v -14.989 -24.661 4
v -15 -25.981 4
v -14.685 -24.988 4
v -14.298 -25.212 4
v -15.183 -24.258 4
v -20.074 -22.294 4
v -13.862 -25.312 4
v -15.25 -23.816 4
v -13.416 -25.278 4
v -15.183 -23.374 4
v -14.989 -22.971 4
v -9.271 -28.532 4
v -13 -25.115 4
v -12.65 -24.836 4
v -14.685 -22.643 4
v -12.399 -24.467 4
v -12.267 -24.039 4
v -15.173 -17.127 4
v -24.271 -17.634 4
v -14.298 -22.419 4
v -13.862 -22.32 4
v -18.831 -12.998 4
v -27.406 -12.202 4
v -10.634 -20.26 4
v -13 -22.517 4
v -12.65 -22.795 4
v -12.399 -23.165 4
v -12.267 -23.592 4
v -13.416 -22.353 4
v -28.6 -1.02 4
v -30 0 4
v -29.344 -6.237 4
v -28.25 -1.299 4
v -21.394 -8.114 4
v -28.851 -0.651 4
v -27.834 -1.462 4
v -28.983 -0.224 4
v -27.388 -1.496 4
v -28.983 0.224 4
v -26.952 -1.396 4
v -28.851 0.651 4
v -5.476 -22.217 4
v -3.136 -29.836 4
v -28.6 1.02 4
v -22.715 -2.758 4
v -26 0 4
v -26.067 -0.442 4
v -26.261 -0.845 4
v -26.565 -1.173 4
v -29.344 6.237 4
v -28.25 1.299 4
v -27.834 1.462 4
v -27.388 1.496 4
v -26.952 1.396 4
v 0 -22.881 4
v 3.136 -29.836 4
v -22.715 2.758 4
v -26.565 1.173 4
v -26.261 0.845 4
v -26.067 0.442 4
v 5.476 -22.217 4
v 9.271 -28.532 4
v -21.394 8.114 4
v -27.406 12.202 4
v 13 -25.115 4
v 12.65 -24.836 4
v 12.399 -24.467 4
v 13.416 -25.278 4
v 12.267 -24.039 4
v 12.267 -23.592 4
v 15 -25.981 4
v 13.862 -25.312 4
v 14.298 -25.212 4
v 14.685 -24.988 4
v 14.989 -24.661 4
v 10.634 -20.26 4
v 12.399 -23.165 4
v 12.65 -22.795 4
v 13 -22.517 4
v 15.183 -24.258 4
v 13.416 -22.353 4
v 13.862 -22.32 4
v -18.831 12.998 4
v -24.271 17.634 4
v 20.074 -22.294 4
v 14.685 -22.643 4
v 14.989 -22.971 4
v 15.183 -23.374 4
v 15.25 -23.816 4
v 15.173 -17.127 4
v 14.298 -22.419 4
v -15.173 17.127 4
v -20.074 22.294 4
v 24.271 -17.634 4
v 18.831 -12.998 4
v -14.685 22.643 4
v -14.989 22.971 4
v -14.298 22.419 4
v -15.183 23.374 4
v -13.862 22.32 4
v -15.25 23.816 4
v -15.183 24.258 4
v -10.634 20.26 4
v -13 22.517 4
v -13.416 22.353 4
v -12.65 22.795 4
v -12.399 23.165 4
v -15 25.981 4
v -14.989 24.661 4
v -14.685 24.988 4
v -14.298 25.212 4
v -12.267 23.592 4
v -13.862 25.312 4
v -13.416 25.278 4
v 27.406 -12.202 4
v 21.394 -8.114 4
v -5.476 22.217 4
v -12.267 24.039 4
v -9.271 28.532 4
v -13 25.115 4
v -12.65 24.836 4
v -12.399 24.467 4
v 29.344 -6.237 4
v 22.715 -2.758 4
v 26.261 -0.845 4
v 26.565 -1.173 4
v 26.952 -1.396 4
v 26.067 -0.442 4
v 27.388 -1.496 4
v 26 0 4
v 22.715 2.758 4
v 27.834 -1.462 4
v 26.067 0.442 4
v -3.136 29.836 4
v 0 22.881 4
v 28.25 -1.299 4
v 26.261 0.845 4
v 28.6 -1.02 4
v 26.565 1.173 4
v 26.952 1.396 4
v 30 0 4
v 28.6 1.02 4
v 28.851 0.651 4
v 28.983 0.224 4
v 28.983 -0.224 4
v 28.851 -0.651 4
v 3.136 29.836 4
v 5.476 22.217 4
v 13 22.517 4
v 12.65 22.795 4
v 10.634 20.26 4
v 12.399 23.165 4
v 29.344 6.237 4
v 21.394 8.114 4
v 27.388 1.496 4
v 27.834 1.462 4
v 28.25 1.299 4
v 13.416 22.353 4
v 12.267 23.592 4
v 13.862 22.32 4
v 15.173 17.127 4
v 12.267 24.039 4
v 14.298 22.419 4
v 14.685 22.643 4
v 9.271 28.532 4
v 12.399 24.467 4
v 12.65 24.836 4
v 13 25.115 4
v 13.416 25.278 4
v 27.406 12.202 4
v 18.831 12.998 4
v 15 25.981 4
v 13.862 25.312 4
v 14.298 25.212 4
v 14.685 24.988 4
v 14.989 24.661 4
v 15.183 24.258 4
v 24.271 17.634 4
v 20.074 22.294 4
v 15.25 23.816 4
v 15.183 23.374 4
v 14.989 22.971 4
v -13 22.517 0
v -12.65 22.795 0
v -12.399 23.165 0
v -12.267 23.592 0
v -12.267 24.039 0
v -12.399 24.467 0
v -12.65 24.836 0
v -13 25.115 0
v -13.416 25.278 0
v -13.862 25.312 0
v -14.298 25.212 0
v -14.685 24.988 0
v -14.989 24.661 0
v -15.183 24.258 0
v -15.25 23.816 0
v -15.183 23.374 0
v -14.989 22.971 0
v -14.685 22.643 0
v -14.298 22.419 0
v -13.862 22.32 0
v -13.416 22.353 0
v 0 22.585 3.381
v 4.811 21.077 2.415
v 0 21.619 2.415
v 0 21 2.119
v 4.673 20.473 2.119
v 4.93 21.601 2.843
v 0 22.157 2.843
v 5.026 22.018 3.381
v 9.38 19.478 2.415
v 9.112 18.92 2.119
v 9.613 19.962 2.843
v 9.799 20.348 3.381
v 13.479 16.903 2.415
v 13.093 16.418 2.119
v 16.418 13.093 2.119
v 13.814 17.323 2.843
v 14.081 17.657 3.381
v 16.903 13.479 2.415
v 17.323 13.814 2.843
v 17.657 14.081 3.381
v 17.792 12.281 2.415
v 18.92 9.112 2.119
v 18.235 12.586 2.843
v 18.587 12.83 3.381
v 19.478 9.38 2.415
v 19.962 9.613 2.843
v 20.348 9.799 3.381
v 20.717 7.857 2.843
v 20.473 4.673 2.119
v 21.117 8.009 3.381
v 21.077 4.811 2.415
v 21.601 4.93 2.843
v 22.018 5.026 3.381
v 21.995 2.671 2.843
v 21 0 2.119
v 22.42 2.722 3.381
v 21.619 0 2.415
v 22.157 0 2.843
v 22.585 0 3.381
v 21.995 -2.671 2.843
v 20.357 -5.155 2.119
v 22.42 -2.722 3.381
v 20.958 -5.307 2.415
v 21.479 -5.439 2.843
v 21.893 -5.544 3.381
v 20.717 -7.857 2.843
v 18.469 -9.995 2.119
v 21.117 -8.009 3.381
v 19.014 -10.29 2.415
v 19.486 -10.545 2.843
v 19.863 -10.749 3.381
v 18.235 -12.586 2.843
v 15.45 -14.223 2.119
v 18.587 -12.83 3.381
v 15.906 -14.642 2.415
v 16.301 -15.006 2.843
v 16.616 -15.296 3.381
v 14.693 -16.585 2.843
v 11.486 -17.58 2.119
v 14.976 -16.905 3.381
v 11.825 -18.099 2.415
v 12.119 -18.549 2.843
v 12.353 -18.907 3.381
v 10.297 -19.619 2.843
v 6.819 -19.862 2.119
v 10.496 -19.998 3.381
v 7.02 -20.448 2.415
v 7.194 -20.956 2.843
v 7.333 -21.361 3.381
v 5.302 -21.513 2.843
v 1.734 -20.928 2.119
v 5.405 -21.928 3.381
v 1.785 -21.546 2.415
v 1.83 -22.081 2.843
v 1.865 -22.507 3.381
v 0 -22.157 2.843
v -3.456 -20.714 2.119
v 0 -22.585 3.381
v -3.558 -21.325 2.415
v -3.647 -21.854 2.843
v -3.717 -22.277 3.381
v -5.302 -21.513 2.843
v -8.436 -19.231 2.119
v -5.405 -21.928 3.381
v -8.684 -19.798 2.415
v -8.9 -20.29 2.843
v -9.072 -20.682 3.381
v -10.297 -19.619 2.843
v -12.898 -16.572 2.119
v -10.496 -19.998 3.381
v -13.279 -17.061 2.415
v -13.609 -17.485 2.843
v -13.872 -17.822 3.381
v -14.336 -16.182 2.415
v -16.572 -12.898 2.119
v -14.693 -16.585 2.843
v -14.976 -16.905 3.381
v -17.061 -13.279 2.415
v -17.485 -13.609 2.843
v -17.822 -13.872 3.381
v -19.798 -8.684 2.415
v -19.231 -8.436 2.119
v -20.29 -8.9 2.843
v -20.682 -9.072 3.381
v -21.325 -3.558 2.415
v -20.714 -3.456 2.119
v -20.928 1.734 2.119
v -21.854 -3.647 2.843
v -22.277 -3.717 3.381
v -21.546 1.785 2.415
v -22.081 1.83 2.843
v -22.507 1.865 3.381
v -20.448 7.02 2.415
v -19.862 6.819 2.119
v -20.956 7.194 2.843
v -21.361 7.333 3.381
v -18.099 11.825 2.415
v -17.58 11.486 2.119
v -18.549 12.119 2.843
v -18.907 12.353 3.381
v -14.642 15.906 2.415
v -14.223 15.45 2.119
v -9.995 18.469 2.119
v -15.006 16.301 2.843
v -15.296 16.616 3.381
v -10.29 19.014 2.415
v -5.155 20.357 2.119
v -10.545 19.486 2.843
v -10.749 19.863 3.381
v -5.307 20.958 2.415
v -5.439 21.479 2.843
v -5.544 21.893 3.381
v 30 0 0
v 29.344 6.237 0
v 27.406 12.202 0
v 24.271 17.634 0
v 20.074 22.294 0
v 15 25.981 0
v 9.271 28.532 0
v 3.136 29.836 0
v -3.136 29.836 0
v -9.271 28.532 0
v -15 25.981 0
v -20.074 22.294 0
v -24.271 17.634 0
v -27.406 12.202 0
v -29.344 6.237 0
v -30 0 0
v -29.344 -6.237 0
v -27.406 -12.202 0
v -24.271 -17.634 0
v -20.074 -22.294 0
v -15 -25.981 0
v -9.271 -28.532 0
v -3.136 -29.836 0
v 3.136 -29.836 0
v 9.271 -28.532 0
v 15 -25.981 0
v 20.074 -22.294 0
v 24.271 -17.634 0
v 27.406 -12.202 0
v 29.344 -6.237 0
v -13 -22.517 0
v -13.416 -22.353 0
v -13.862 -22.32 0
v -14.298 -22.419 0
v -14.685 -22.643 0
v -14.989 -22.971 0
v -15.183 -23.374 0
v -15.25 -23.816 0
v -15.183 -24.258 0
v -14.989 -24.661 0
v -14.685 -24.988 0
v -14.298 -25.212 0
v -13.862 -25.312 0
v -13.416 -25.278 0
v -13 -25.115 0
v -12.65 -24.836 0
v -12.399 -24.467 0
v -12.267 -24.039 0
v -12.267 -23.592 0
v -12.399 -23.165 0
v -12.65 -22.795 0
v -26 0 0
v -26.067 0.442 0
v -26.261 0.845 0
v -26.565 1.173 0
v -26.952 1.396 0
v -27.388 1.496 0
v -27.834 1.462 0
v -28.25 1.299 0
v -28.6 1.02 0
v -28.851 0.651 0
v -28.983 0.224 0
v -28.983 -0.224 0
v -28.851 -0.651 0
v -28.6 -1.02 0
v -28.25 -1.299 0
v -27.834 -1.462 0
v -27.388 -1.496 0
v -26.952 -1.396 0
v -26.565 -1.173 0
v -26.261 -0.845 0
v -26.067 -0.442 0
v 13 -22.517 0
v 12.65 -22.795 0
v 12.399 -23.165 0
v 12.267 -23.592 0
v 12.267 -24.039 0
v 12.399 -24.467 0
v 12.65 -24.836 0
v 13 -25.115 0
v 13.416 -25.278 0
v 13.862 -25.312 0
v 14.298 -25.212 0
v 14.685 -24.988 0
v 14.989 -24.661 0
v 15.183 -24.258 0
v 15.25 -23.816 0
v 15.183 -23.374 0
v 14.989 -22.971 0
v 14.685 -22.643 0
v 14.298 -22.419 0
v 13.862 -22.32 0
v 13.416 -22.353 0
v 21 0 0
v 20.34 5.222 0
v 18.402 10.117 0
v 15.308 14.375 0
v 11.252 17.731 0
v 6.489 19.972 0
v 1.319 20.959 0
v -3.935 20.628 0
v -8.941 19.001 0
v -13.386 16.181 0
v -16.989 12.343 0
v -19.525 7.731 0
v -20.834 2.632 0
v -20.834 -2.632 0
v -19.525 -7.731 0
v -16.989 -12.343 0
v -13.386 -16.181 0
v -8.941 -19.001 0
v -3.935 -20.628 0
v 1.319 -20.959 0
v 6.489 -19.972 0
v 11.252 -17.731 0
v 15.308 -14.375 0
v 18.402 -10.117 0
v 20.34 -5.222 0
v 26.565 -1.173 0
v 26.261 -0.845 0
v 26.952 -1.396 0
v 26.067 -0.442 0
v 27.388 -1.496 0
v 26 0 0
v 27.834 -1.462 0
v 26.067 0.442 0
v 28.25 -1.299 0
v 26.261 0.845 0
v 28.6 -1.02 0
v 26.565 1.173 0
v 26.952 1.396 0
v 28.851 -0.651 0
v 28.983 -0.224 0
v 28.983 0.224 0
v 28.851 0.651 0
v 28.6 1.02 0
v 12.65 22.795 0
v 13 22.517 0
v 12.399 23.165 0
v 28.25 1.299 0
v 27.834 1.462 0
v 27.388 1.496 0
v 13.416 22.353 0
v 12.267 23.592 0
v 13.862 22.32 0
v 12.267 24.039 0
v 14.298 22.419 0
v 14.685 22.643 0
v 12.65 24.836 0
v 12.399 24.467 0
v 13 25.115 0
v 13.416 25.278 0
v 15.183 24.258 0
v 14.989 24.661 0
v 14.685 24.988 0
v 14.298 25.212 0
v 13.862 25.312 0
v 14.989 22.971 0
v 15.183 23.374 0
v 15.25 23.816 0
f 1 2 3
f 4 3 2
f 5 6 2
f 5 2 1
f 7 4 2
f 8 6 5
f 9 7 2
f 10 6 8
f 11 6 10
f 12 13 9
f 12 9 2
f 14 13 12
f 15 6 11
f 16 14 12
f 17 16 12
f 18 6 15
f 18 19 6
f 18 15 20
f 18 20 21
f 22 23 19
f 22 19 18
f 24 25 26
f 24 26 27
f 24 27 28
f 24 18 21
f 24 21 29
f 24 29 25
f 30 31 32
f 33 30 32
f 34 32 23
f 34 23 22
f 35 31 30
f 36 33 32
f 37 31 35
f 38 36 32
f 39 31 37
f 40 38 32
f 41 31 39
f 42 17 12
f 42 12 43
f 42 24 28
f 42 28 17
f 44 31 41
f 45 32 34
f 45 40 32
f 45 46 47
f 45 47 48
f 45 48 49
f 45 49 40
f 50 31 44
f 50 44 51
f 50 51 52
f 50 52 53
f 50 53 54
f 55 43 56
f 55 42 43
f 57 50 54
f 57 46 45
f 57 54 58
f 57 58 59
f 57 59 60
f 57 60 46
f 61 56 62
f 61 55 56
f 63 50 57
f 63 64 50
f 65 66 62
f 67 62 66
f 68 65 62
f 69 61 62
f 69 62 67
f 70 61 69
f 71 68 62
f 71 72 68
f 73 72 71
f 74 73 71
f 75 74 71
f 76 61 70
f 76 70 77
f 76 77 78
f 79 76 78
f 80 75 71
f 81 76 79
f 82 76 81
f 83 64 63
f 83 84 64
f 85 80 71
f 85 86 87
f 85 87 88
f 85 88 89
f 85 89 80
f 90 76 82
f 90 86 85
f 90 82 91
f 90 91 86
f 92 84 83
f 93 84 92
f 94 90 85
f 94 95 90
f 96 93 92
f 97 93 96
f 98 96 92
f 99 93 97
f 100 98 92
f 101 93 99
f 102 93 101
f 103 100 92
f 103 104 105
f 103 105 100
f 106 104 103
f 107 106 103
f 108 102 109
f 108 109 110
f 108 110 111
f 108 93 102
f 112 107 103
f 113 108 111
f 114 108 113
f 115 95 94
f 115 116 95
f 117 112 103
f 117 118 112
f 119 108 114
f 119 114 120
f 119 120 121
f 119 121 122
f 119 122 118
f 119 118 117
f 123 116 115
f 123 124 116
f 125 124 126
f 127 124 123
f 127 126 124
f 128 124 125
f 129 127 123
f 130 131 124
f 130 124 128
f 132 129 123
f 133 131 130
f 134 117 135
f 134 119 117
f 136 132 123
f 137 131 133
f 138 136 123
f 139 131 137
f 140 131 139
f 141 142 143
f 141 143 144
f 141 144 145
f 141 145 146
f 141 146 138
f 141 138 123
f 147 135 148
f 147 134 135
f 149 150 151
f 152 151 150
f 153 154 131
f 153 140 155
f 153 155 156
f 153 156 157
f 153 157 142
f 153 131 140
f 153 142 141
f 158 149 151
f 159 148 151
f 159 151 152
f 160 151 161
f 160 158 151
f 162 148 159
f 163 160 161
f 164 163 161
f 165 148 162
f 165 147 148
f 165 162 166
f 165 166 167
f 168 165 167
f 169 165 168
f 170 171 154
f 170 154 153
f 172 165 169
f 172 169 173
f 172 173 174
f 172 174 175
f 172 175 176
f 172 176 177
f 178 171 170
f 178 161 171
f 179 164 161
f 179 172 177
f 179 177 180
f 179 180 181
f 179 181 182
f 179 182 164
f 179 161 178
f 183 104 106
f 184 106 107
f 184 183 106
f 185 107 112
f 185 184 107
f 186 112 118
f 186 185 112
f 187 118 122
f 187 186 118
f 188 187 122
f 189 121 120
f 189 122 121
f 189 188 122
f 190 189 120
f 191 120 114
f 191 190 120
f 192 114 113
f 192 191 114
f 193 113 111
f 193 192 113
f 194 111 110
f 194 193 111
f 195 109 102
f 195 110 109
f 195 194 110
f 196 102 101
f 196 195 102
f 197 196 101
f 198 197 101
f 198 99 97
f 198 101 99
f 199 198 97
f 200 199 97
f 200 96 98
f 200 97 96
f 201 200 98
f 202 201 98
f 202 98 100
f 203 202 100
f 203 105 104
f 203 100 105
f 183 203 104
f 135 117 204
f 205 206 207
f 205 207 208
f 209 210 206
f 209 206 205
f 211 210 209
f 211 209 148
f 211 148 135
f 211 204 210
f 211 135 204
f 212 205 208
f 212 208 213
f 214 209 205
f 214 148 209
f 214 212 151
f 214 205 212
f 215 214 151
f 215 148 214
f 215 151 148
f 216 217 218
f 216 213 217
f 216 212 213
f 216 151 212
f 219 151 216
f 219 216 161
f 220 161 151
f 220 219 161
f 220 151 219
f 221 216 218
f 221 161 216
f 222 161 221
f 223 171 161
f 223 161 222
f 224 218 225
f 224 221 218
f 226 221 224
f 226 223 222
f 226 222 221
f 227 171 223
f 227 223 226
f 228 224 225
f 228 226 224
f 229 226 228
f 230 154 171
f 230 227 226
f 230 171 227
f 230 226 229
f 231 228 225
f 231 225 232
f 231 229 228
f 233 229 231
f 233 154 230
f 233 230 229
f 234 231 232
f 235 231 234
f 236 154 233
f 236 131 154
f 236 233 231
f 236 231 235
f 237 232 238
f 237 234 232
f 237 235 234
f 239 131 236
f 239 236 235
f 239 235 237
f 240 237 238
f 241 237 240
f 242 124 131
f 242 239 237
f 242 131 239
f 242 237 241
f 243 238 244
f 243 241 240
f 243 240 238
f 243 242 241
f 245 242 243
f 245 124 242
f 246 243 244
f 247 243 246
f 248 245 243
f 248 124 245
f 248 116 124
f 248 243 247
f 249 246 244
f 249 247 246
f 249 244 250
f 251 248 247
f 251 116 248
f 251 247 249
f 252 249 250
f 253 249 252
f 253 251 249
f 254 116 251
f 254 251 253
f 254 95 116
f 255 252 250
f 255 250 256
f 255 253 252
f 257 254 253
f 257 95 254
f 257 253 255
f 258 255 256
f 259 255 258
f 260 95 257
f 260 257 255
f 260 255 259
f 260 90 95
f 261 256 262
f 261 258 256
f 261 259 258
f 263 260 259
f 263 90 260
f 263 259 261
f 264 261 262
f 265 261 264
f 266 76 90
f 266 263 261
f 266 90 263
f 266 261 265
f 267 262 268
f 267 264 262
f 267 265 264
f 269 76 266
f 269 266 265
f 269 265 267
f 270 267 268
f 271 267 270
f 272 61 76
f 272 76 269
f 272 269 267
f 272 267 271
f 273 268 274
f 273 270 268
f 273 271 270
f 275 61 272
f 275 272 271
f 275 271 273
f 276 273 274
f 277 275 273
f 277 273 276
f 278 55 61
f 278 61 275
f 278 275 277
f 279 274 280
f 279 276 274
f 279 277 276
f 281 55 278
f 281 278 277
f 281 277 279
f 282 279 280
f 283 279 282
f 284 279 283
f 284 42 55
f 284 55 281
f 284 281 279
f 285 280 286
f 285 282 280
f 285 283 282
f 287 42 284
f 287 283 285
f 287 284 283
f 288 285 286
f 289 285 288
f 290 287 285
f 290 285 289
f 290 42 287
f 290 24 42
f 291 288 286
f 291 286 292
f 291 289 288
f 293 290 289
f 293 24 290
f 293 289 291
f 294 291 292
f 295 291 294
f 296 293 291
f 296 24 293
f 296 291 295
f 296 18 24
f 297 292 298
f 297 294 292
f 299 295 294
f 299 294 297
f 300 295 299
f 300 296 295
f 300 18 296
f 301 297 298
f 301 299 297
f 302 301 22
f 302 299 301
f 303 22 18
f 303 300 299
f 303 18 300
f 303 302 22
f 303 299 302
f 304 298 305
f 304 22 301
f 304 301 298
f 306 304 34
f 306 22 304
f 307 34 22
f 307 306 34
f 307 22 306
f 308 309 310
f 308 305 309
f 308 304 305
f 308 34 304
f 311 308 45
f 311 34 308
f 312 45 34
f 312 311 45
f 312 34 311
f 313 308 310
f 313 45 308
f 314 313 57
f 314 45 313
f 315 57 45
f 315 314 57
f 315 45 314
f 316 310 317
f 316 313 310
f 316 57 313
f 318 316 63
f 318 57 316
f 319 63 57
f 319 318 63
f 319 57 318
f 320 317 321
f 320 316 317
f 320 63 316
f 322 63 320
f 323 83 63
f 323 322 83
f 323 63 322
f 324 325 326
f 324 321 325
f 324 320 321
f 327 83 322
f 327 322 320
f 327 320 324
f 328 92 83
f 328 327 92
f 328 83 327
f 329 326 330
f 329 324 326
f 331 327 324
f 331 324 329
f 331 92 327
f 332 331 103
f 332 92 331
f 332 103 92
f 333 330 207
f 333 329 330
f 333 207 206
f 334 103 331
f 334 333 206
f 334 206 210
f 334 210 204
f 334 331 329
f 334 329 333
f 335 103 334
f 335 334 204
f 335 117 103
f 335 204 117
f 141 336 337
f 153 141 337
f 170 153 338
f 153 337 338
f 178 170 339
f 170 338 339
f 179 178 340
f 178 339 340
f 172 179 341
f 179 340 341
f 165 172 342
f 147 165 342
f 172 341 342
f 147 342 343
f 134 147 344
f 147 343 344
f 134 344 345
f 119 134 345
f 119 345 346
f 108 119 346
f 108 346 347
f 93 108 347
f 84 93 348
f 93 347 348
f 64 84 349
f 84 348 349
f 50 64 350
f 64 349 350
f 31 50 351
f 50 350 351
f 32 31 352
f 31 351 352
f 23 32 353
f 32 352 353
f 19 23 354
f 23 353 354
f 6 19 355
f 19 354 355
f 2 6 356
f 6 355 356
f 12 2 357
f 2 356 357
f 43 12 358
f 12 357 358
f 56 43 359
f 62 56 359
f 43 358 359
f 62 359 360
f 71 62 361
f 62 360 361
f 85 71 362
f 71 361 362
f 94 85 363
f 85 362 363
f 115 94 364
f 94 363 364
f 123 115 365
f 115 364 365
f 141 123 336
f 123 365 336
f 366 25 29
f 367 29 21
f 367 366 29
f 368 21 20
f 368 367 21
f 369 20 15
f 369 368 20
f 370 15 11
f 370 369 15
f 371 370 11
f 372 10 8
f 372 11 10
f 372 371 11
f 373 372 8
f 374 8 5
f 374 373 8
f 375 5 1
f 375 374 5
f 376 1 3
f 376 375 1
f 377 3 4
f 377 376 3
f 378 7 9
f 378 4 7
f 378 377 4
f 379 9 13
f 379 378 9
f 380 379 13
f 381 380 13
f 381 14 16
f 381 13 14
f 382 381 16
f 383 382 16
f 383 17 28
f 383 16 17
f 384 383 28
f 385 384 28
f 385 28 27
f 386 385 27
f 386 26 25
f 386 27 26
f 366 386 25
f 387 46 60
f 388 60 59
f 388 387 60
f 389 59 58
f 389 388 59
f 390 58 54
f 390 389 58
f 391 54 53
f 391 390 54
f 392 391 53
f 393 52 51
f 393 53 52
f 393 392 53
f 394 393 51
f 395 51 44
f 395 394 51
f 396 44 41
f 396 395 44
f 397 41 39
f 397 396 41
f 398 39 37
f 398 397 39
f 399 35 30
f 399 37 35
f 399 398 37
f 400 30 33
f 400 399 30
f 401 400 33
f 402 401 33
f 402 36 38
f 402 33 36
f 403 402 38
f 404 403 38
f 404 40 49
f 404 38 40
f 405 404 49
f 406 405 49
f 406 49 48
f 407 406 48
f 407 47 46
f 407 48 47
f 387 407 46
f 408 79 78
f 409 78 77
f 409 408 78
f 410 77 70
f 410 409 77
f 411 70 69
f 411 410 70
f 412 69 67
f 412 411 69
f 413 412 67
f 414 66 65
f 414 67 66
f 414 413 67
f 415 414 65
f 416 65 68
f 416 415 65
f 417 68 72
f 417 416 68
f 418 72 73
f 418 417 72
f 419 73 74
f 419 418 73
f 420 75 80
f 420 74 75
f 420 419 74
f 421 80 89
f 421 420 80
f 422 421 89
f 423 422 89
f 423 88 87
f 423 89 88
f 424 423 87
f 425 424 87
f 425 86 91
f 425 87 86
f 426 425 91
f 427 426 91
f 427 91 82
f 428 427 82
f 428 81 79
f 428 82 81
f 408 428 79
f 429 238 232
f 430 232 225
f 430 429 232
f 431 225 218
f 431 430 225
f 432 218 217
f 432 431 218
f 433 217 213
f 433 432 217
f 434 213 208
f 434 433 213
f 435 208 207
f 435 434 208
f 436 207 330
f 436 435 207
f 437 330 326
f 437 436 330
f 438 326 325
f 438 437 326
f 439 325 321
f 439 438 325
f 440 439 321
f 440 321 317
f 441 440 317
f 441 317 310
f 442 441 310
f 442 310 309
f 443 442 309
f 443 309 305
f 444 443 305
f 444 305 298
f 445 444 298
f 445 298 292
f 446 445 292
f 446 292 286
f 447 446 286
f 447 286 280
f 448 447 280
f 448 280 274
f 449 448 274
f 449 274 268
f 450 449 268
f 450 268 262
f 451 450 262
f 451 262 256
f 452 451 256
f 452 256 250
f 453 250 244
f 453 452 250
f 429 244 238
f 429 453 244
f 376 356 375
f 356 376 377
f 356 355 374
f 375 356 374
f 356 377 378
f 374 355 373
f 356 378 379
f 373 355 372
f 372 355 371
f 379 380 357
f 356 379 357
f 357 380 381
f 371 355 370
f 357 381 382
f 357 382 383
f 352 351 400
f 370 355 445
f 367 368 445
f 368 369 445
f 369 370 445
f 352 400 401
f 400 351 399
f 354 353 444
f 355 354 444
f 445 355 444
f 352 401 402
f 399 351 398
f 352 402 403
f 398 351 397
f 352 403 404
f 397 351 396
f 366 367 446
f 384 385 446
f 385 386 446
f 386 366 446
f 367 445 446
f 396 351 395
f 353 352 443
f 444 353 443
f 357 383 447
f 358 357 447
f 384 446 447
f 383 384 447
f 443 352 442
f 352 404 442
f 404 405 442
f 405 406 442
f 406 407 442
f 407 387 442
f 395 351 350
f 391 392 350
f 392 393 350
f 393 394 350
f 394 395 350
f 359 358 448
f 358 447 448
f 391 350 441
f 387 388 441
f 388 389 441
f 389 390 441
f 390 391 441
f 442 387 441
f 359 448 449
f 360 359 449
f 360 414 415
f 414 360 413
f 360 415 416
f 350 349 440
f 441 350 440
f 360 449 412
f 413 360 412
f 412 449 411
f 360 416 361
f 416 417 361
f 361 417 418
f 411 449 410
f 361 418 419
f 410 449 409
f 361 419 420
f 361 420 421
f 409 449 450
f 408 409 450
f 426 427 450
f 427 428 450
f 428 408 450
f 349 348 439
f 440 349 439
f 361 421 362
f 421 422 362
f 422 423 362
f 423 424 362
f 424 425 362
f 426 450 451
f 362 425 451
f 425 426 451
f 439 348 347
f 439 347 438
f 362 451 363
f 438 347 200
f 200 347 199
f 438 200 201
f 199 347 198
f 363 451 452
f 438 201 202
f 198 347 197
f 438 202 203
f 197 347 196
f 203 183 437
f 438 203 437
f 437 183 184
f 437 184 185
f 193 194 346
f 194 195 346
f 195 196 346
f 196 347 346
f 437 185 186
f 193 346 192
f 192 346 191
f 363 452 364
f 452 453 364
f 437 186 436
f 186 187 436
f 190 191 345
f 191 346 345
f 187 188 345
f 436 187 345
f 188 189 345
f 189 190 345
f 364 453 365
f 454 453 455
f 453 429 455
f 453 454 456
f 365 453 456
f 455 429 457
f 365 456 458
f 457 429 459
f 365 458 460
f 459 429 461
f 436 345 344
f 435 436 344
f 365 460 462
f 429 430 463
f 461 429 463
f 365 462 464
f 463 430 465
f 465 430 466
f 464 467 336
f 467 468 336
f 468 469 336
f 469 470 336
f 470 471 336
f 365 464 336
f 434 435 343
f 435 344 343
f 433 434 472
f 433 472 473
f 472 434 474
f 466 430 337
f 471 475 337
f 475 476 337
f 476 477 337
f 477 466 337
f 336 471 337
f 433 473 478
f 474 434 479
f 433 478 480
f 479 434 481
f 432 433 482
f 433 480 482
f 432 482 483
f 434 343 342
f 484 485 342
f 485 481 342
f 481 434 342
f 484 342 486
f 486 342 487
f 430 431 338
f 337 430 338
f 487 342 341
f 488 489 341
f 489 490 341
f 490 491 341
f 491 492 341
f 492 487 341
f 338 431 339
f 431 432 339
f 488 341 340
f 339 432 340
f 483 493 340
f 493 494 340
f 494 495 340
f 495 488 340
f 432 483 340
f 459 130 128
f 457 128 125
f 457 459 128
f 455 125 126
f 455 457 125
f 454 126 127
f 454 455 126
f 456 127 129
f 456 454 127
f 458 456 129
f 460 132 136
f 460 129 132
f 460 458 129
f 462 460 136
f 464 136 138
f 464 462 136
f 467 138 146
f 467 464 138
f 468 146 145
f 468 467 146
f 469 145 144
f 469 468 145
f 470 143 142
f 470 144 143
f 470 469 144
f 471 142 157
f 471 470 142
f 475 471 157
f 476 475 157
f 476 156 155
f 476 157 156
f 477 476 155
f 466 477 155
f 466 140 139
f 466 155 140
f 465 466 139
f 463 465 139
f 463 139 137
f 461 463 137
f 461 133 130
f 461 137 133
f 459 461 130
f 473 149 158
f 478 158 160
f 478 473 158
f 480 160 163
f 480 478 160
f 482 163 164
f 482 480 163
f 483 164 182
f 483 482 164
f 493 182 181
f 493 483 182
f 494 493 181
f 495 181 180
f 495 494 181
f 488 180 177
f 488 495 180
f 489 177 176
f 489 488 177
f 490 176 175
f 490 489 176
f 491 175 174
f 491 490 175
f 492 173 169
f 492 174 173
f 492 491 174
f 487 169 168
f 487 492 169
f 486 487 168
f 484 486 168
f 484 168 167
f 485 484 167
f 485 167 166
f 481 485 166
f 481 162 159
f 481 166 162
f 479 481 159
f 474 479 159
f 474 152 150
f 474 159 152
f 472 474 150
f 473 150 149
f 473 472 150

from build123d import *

# Parameters (mm, degrees)
SCHIZZO1_R                   = 30
SCHIZZO1_R_2                 = 21
ESTRUSIONE_ESTRUSIONE1_DEPTH = 4
SCHIZZO2_R                   = 3.05
SCHIZZO3_R                   = 1.5
TAGLIO_ESTRUSIONE1_DEPTH     = 10
RIPETIZIONECIRCOLARE1_COUNT  = 6


with BuildPart() as part:
    # Schizzo1 → Estrusione-Estrusione1 (new body)
    with BuildSketch(Plane.XY):
        Circle(SCHIZZO1_R)
        Circle(SCHIZZO1_R_2, mode=Mode.SUBTRACT)
    extrude(amount=ESTRUSIONE_ESTRUSIONE1_DEPTH)

    # Schizzo2 → Taglia-Rivoluzione1 (revolve, cut)
    with BuildSketch(Plane(origin=(0, 0, 0), x_dir=(0, 0, -1), z_dir=(1, 0, 0))):
        with Locations((-5, 20)):
            Circle(SCHIZZO2_R)
    revolve(axis=Axis((0, 0, 4), (0, 0, -1)), mode=Mode.SUBTRACT)

    # Schizzo3 → Taglio-Estrusione1 (cut)
    with BuildSketch(Plane.XY):
        with Locations((-27.5, 0)):
            Circle(SCHIZZO3_R)
    taglio_estrusione1 = extrude(amount=TAGLIO_ESTRUSIONE1_DEPTH, mode=Mode.SUBTRACT)

    # RipetizioneCircolare1: Taglio-Estrusione1 ×6 about axis
    ripetizionecircolare1_axis = Axis((0, 0, 0), (0, 0, 1))
    for i in range(1, RIPETIZIONECIRCOLARE1_COUNT):
        add(taglio_estrusione1.rotate(ripetizionecircolare1_axis, i * 360 / RIPETIZIONECIRCOLARE1_COUNT), mode=Mode.SUBTRACT)


solid = part.part
